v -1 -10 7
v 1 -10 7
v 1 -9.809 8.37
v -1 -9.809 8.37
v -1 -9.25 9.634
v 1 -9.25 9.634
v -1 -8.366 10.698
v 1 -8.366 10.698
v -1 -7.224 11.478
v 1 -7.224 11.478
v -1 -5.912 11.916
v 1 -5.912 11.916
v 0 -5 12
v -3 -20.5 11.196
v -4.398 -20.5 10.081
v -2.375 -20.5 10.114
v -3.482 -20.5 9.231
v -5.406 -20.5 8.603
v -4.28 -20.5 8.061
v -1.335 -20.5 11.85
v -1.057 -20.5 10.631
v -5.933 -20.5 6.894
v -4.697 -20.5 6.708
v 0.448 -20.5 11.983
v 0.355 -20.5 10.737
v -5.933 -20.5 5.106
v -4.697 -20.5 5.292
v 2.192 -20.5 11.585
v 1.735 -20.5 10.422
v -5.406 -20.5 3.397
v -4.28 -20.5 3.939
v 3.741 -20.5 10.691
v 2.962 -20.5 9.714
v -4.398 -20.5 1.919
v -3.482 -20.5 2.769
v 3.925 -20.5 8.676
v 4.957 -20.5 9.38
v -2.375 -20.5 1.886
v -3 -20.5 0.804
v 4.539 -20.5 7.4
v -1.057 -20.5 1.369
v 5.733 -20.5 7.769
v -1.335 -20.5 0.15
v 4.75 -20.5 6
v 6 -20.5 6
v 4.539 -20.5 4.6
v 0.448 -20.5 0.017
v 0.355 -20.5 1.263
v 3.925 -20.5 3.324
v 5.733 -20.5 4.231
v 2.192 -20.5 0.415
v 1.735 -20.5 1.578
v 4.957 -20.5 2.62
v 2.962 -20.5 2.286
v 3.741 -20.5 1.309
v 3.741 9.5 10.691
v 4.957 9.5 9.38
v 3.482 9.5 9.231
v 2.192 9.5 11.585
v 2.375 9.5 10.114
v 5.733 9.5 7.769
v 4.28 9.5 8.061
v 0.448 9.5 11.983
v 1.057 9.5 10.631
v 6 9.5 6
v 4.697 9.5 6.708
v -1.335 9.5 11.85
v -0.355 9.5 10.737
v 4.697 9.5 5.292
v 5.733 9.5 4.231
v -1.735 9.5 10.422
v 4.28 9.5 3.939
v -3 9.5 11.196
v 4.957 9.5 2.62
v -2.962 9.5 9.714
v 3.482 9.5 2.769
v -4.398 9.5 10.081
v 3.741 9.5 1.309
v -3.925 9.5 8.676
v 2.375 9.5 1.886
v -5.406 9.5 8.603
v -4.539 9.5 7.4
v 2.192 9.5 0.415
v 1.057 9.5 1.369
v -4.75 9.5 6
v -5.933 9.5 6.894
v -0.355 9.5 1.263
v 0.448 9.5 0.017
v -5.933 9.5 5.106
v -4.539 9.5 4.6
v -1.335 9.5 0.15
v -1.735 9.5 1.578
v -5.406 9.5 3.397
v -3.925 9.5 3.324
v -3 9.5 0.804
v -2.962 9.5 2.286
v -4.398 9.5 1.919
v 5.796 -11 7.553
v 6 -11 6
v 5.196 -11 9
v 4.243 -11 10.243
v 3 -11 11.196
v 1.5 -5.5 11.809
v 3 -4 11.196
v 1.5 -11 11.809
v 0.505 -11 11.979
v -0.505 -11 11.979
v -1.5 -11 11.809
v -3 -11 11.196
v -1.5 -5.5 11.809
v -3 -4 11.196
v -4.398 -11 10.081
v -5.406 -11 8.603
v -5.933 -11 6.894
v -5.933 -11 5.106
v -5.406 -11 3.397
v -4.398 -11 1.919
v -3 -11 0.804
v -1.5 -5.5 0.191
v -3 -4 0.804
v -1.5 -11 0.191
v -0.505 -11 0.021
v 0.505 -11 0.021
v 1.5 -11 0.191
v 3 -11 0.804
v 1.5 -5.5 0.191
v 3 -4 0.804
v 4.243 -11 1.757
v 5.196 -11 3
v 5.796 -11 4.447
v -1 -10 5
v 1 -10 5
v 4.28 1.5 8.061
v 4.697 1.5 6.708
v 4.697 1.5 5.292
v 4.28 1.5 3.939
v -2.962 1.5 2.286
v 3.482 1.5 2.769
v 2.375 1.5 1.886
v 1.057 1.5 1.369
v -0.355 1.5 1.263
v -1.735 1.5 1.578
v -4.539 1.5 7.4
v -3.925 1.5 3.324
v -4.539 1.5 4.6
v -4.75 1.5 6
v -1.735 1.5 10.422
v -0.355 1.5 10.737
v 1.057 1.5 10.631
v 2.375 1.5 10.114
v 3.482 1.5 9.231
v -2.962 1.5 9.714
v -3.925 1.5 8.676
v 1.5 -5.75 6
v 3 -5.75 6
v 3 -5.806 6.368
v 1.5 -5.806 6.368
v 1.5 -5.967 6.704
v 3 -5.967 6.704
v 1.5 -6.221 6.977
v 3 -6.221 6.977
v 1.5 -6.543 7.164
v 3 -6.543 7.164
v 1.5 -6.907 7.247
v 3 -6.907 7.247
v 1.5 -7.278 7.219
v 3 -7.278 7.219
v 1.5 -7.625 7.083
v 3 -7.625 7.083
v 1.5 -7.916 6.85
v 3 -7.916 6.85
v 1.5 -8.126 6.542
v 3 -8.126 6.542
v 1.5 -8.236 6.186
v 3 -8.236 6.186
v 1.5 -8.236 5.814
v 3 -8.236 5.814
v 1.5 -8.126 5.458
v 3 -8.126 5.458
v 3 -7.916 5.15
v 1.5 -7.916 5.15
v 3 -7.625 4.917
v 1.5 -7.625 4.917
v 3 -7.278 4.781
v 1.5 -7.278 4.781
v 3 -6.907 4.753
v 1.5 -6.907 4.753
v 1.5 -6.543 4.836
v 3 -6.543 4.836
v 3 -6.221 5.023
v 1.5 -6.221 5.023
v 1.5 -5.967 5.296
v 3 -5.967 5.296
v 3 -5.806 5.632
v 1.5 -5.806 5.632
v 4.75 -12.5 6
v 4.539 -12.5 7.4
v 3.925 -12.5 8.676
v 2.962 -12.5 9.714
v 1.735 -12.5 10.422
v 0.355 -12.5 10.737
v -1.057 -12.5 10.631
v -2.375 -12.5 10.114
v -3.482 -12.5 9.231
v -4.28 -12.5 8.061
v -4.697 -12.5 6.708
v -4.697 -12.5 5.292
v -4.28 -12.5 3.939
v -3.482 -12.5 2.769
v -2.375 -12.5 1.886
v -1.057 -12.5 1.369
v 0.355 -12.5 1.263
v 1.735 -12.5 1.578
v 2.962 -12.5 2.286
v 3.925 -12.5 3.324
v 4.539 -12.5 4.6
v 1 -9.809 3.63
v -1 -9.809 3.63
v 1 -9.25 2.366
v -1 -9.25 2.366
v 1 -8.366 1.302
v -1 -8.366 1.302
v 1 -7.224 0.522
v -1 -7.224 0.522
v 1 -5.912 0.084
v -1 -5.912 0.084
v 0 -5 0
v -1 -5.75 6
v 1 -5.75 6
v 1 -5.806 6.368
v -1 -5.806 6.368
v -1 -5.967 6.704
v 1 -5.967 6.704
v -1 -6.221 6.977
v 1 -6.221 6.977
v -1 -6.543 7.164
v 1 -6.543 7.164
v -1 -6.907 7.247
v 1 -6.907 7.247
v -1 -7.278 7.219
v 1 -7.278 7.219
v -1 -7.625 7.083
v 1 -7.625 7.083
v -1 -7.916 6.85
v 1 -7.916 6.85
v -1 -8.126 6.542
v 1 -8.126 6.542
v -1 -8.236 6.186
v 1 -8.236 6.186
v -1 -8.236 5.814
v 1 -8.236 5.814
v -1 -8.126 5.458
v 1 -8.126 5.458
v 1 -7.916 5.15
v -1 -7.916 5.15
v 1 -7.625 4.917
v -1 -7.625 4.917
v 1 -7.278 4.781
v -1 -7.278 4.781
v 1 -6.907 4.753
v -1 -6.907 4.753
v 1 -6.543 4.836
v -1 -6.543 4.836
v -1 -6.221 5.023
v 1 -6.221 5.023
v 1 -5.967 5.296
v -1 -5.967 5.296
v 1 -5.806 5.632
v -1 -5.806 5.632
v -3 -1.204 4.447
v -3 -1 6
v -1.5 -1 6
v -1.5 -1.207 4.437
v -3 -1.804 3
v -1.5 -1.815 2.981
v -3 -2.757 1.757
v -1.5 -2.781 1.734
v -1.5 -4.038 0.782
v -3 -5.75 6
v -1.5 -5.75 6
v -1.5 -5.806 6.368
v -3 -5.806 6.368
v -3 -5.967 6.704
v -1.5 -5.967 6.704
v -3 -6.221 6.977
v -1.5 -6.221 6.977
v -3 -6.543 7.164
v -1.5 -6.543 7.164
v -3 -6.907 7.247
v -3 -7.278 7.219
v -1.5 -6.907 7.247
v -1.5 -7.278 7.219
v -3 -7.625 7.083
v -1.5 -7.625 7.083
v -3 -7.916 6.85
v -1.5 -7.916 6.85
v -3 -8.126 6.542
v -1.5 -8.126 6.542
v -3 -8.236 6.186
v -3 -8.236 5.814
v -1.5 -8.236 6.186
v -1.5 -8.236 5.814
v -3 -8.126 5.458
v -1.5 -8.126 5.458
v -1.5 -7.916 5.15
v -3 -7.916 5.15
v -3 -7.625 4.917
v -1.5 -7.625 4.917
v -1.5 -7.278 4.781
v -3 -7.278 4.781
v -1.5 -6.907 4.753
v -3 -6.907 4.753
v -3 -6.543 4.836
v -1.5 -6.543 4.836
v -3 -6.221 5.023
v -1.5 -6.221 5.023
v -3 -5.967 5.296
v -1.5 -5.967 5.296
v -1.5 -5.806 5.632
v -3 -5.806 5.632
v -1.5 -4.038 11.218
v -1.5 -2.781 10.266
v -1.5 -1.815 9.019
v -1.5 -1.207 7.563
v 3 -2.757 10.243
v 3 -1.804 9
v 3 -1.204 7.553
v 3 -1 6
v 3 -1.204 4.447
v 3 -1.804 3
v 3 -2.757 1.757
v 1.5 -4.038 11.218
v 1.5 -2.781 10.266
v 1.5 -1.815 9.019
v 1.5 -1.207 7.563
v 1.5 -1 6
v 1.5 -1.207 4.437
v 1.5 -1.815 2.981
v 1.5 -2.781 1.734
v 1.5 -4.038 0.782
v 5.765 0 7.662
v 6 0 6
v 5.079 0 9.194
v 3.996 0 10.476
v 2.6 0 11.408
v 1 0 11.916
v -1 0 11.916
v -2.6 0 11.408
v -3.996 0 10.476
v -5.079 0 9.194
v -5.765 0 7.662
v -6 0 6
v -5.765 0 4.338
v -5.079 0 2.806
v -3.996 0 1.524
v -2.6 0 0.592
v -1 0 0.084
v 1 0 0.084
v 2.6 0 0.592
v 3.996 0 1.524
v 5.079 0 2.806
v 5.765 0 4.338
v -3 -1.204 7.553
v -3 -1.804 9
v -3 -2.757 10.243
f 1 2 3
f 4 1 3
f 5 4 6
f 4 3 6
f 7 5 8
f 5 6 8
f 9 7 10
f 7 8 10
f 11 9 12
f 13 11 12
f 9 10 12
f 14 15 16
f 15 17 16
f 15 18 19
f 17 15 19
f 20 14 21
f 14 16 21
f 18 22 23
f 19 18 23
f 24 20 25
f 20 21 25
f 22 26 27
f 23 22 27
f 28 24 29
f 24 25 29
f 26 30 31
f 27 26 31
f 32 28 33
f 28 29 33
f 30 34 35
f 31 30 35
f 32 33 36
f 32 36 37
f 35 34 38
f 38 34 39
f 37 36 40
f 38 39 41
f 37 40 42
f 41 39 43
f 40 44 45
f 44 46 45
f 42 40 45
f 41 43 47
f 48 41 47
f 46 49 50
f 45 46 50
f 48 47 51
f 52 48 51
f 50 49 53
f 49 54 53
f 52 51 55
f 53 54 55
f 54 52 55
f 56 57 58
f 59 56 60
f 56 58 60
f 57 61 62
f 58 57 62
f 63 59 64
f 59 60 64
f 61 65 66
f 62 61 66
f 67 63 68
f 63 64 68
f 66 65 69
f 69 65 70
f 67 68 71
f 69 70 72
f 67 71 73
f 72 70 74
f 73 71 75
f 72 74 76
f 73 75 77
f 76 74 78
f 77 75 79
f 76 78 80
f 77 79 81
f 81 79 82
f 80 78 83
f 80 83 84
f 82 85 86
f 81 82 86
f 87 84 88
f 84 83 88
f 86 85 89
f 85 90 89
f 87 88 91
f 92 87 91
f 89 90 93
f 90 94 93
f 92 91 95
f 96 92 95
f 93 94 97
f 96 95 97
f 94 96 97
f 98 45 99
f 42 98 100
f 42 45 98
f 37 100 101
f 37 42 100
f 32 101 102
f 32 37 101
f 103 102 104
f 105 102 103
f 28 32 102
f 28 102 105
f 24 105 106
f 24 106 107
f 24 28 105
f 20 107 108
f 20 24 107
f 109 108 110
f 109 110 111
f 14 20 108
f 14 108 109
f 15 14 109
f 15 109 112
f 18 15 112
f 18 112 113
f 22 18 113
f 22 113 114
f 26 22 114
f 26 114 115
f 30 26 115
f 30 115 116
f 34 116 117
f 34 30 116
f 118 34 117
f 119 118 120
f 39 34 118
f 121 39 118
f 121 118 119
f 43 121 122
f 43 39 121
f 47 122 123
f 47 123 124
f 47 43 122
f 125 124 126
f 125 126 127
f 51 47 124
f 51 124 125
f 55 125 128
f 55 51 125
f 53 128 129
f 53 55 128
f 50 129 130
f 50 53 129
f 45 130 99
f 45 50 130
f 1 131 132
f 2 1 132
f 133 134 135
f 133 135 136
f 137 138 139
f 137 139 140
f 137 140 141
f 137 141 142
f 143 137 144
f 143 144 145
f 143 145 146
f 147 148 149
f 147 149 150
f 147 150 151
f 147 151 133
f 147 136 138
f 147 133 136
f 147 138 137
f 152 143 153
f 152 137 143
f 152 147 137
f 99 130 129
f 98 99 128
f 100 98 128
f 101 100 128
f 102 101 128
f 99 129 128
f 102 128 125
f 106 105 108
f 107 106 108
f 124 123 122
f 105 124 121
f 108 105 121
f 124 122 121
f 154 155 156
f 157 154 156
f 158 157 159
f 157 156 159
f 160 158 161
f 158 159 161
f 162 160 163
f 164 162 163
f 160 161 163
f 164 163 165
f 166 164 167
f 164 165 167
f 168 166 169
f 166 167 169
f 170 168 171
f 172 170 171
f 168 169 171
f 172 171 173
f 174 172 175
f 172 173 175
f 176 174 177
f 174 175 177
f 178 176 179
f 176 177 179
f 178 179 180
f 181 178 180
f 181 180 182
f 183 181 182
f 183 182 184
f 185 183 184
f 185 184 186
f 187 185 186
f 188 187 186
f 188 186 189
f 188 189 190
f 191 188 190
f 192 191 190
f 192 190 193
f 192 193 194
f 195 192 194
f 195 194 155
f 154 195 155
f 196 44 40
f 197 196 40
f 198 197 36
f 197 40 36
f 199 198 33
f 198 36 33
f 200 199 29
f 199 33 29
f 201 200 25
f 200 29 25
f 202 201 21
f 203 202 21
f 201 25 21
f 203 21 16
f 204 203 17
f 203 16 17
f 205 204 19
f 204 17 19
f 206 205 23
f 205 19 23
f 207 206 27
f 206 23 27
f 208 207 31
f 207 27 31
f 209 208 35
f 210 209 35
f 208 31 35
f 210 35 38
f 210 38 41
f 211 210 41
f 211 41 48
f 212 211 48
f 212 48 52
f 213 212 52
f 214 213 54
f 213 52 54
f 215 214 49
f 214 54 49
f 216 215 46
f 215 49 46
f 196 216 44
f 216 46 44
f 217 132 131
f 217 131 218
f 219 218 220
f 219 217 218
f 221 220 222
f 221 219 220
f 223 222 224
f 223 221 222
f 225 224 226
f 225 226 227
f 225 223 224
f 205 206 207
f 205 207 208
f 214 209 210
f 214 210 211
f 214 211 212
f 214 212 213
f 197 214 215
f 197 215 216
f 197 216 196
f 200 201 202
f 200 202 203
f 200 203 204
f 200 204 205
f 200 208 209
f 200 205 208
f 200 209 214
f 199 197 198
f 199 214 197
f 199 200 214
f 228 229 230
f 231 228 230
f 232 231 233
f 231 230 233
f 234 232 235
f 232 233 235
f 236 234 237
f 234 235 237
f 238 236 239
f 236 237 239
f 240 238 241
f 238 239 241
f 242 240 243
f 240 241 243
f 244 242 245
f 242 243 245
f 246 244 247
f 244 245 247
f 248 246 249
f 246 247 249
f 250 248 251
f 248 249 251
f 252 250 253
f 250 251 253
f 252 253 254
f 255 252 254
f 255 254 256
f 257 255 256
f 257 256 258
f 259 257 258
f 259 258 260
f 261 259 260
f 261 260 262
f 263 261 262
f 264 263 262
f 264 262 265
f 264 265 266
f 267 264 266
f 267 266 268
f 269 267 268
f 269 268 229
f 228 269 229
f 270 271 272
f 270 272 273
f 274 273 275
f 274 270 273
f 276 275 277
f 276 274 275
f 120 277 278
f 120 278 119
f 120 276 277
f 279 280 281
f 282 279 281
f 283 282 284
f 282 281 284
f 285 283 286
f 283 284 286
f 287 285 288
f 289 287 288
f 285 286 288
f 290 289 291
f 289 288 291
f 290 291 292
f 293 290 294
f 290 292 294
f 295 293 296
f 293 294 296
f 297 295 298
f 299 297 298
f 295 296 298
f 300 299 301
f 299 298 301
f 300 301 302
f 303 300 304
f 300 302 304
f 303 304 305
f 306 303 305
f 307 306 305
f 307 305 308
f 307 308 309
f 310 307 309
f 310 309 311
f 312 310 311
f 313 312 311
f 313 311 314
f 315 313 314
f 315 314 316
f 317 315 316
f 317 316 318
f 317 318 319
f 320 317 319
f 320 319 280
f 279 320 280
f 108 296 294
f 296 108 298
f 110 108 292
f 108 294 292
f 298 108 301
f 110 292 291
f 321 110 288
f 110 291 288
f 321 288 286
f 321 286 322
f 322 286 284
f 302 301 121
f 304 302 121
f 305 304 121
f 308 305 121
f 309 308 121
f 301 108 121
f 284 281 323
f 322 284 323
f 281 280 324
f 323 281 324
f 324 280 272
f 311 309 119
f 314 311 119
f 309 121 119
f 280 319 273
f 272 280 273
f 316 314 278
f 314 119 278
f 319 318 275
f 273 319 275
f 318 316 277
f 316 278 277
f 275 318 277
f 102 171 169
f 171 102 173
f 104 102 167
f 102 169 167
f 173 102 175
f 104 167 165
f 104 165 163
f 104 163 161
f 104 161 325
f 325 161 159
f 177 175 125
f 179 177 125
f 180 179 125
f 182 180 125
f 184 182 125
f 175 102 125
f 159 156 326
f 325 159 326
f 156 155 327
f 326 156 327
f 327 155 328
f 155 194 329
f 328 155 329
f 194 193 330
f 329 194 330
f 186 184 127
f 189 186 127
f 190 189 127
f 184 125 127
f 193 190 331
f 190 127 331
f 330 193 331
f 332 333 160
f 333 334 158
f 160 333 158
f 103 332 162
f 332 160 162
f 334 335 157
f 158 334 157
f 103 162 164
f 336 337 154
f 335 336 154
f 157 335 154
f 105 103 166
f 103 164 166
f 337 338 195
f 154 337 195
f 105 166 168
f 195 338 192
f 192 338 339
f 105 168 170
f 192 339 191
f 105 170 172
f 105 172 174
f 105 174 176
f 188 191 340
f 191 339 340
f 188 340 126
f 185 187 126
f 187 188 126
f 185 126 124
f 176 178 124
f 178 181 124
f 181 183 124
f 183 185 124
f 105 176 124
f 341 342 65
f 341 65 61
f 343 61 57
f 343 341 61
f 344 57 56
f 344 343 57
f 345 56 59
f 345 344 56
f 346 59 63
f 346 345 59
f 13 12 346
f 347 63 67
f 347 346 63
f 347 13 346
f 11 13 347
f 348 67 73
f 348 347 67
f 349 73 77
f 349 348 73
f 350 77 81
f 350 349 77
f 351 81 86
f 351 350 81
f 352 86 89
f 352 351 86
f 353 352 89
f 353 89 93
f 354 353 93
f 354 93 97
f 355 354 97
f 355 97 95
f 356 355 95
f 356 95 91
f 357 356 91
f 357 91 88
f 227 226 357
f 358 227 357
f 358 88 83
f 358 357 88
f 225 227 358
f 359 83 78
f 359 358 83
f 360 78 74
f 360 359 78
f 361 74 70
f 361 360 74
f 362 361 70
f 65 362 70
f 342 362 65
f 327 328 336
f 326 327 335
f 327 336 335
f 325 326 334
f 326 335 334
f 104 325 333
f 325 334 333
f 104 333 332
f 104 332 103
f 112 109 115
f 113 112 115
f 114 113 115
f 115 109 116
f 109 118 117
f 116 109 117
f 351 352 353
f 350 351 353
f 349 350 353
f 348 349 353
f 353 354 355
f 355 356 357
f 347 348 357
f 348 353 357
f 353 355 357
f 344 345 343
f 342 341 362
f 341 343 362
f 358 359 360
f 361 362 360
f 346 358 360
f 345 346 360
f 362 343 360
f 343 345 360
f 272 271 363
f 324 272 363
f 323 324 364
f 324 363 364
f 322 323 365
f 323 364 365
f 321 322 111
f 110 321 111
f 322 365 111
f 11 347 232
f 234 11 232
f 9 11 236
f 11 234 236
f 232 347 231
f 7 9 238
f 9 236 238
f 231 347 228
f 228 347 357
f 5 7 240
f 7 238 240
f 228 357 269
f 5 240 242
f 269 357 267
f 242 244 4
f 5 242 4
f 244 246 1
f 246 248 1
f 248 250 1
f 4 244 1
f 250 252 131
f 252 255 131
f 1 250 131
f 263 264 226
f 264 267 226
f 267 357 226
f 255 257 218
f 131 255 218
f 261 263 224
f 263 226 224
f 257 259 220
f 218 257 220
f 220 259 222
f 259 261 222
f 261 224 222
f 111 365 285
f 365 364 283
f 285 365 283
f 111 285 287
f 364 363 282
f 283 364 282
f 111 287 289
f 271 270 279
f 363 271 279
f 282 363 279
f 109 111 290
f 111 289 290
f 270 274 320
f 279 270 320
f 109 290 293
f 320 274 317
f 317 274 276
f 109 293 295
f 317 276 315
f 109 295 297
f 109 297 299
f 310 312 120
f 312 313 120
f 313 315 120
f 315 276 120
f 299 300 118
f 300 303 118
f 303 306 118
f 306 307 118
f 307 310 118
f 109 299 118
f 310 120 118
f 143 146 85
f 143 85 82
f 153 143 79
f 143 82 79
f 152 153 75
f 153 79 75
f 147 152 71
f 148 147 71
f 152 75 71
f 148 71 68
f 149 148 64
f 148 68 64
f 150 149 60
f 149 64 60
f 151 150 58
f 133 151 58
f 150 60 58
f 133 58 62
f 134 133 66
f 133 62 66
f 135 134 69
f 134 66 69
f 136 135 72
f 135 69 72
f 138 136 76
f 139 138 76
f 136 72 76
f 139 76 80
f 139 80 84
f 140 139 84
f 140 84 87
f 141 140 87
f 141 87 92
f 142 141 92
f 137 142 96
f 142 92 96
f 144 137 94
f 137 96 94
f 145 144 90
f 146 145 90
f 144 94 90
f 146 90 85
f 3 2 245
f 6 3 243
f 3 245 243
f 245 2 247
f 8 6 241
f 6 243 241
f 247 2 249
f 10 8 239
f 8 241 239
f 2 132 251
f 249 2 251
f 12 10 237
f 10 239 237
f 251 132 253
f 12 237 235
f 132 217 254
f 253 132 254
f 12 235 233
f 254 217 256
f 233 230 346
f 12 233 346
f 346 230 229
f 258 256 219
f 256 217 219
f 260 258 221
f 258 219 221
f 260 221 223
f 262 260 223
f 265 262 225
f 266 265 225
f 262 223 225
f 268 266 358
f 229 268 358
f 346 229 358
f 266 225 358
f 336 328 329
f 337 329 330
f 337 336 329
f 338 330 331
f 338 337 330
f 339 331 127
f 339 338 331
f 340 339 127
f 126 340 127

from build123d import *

# Parameters (mm, degrees)
F1_DEPTH  = 12
F3_R      = 5.99999
F4_R      = 5
F2_W      = 18.0606292561
F2_H      = 16.2687138654
F2_R      = 6
F5_DEPTH  = 35.7
F6_R      = 1.25
F7_DEPTH  = 25
F8_R      = 4.75
F9_DEPTH  = 8
F10_R     = 4.75
F11_DEPTH = 8


# Not quite as in the source:
# - a fillet or chamfer is up to 0.001 mm smaller than in the source, because OpenCascade refuses the exact size


with BuildPart() as f1:
    # F0 (on Top) → F1 (new body)
    with BuildSketch(Plane.XY):
        Polygon((6, 9.5), (-6, 9.5), (-6, 0), (-1, 0), (-1, -10), (1, -10), (1, 0), (6, 0), align=None)
    extrude(amount=F1_DEPTH)

    # F4
    f4_edges = [f1.edges().sort_by_distance(p)[0] for p in [
        (0, -10, 12),
        (0, -10, 0),
    ]]
    fillet(f4_edges, radius=F4_R)


with BuildPart() as f1b:
    # F0 (on Top) → F1, piece 2 (new body)
    with BuildSketch(Plane.XY):
        Polygon((-6, -11), (-6, -20.5), (6, -20.5), (6, -11), (3, -11), (3, -1), (1.5, -1), (1.5, -11), (-1.5, -11), (-1.5, -1), (-3, -1), (-3, -11), align=None)
    extrude(amount=F1_DEPTH)

    # F3 (radius 6 in the source; OpenCascade refuses exactly that, so slightly less here)
    f3_edges = [f1b.edges().sort_by_distance(p)[0] for p in [
        (2.25, -1, 12),
        (2.25, -1, 0),
        (-2.25, -1, 0),
        (-2.25, -1, 12),
    ]]
    fillet(f3_edges, radius=F3_R)


with BuildPart() as f5_tool:
    # F2 (on face) → F5 (new body)
    with BuildSketch(Plane.XZ.offset(20.5)):
        with Locations((0.2045785077, 5.5509812664)):
            Rectangle(F2_W, F2_H)
        with Locations((0, 6)):
            Circle(F2_R, mode=Mode.SUBTRACT)
    extrude(amount=-F5_DEPTH)


with BuildPart() as f1_1:
    add(f1.part)

    # F5: cut by f5_tool
    add(f5_tool.part, mode=Mode.SUBTRACT)


with BuildPart() as f1b_1:
    add(f1b.part)

    # F5: cut by f5_tool
    add(f5_tool.part, mode=Mode.SUBTRACT)


with BuildPart() as f7_tool:
    # F6 (on face) → F7 (new body)
    with BuildSketch(Plane.YZ.offset(3)):
        with Locations((-7, 6)):
            Circle(F6_R)
    extrude(amount=-F7_DEPTH)


with BuildPart() as f1_2:
    add(f1_1.part)

    # F7: cut by f7_tool
    add(f7_tool.part, mode=Mode.SUBTRACT)

    # F10 (on face) → F11 (cut)
    with BuildSketch(Plane(origin=(0, 9.5, 0), x_dir=(-1, 0, 0), z_dir=(0, 1, 0))):
        with Locations((0, 6)):
            Circle(F10_R)
    extrude(amount=-F11_DEPTH, mode=Mode.SUBTRACT)


with BuildPart() as f1b_2:
    add(f1b_1.part)

    # F7: cut by f7_tool
    add(f7_tool.part, mode=Mode.SUBTRACT)

    # F8 (on face) → F9 (cut)
    with BuildSketch(Plane.XZ.offset(20.5)):
        with Locations((0, 6)):
            Circle(F8_R)
    extrude(amount=-F9_DEPTH, mode=Mode.SUBTRACT)


solid = Compound([f1_2.part, f1b_2.part])
